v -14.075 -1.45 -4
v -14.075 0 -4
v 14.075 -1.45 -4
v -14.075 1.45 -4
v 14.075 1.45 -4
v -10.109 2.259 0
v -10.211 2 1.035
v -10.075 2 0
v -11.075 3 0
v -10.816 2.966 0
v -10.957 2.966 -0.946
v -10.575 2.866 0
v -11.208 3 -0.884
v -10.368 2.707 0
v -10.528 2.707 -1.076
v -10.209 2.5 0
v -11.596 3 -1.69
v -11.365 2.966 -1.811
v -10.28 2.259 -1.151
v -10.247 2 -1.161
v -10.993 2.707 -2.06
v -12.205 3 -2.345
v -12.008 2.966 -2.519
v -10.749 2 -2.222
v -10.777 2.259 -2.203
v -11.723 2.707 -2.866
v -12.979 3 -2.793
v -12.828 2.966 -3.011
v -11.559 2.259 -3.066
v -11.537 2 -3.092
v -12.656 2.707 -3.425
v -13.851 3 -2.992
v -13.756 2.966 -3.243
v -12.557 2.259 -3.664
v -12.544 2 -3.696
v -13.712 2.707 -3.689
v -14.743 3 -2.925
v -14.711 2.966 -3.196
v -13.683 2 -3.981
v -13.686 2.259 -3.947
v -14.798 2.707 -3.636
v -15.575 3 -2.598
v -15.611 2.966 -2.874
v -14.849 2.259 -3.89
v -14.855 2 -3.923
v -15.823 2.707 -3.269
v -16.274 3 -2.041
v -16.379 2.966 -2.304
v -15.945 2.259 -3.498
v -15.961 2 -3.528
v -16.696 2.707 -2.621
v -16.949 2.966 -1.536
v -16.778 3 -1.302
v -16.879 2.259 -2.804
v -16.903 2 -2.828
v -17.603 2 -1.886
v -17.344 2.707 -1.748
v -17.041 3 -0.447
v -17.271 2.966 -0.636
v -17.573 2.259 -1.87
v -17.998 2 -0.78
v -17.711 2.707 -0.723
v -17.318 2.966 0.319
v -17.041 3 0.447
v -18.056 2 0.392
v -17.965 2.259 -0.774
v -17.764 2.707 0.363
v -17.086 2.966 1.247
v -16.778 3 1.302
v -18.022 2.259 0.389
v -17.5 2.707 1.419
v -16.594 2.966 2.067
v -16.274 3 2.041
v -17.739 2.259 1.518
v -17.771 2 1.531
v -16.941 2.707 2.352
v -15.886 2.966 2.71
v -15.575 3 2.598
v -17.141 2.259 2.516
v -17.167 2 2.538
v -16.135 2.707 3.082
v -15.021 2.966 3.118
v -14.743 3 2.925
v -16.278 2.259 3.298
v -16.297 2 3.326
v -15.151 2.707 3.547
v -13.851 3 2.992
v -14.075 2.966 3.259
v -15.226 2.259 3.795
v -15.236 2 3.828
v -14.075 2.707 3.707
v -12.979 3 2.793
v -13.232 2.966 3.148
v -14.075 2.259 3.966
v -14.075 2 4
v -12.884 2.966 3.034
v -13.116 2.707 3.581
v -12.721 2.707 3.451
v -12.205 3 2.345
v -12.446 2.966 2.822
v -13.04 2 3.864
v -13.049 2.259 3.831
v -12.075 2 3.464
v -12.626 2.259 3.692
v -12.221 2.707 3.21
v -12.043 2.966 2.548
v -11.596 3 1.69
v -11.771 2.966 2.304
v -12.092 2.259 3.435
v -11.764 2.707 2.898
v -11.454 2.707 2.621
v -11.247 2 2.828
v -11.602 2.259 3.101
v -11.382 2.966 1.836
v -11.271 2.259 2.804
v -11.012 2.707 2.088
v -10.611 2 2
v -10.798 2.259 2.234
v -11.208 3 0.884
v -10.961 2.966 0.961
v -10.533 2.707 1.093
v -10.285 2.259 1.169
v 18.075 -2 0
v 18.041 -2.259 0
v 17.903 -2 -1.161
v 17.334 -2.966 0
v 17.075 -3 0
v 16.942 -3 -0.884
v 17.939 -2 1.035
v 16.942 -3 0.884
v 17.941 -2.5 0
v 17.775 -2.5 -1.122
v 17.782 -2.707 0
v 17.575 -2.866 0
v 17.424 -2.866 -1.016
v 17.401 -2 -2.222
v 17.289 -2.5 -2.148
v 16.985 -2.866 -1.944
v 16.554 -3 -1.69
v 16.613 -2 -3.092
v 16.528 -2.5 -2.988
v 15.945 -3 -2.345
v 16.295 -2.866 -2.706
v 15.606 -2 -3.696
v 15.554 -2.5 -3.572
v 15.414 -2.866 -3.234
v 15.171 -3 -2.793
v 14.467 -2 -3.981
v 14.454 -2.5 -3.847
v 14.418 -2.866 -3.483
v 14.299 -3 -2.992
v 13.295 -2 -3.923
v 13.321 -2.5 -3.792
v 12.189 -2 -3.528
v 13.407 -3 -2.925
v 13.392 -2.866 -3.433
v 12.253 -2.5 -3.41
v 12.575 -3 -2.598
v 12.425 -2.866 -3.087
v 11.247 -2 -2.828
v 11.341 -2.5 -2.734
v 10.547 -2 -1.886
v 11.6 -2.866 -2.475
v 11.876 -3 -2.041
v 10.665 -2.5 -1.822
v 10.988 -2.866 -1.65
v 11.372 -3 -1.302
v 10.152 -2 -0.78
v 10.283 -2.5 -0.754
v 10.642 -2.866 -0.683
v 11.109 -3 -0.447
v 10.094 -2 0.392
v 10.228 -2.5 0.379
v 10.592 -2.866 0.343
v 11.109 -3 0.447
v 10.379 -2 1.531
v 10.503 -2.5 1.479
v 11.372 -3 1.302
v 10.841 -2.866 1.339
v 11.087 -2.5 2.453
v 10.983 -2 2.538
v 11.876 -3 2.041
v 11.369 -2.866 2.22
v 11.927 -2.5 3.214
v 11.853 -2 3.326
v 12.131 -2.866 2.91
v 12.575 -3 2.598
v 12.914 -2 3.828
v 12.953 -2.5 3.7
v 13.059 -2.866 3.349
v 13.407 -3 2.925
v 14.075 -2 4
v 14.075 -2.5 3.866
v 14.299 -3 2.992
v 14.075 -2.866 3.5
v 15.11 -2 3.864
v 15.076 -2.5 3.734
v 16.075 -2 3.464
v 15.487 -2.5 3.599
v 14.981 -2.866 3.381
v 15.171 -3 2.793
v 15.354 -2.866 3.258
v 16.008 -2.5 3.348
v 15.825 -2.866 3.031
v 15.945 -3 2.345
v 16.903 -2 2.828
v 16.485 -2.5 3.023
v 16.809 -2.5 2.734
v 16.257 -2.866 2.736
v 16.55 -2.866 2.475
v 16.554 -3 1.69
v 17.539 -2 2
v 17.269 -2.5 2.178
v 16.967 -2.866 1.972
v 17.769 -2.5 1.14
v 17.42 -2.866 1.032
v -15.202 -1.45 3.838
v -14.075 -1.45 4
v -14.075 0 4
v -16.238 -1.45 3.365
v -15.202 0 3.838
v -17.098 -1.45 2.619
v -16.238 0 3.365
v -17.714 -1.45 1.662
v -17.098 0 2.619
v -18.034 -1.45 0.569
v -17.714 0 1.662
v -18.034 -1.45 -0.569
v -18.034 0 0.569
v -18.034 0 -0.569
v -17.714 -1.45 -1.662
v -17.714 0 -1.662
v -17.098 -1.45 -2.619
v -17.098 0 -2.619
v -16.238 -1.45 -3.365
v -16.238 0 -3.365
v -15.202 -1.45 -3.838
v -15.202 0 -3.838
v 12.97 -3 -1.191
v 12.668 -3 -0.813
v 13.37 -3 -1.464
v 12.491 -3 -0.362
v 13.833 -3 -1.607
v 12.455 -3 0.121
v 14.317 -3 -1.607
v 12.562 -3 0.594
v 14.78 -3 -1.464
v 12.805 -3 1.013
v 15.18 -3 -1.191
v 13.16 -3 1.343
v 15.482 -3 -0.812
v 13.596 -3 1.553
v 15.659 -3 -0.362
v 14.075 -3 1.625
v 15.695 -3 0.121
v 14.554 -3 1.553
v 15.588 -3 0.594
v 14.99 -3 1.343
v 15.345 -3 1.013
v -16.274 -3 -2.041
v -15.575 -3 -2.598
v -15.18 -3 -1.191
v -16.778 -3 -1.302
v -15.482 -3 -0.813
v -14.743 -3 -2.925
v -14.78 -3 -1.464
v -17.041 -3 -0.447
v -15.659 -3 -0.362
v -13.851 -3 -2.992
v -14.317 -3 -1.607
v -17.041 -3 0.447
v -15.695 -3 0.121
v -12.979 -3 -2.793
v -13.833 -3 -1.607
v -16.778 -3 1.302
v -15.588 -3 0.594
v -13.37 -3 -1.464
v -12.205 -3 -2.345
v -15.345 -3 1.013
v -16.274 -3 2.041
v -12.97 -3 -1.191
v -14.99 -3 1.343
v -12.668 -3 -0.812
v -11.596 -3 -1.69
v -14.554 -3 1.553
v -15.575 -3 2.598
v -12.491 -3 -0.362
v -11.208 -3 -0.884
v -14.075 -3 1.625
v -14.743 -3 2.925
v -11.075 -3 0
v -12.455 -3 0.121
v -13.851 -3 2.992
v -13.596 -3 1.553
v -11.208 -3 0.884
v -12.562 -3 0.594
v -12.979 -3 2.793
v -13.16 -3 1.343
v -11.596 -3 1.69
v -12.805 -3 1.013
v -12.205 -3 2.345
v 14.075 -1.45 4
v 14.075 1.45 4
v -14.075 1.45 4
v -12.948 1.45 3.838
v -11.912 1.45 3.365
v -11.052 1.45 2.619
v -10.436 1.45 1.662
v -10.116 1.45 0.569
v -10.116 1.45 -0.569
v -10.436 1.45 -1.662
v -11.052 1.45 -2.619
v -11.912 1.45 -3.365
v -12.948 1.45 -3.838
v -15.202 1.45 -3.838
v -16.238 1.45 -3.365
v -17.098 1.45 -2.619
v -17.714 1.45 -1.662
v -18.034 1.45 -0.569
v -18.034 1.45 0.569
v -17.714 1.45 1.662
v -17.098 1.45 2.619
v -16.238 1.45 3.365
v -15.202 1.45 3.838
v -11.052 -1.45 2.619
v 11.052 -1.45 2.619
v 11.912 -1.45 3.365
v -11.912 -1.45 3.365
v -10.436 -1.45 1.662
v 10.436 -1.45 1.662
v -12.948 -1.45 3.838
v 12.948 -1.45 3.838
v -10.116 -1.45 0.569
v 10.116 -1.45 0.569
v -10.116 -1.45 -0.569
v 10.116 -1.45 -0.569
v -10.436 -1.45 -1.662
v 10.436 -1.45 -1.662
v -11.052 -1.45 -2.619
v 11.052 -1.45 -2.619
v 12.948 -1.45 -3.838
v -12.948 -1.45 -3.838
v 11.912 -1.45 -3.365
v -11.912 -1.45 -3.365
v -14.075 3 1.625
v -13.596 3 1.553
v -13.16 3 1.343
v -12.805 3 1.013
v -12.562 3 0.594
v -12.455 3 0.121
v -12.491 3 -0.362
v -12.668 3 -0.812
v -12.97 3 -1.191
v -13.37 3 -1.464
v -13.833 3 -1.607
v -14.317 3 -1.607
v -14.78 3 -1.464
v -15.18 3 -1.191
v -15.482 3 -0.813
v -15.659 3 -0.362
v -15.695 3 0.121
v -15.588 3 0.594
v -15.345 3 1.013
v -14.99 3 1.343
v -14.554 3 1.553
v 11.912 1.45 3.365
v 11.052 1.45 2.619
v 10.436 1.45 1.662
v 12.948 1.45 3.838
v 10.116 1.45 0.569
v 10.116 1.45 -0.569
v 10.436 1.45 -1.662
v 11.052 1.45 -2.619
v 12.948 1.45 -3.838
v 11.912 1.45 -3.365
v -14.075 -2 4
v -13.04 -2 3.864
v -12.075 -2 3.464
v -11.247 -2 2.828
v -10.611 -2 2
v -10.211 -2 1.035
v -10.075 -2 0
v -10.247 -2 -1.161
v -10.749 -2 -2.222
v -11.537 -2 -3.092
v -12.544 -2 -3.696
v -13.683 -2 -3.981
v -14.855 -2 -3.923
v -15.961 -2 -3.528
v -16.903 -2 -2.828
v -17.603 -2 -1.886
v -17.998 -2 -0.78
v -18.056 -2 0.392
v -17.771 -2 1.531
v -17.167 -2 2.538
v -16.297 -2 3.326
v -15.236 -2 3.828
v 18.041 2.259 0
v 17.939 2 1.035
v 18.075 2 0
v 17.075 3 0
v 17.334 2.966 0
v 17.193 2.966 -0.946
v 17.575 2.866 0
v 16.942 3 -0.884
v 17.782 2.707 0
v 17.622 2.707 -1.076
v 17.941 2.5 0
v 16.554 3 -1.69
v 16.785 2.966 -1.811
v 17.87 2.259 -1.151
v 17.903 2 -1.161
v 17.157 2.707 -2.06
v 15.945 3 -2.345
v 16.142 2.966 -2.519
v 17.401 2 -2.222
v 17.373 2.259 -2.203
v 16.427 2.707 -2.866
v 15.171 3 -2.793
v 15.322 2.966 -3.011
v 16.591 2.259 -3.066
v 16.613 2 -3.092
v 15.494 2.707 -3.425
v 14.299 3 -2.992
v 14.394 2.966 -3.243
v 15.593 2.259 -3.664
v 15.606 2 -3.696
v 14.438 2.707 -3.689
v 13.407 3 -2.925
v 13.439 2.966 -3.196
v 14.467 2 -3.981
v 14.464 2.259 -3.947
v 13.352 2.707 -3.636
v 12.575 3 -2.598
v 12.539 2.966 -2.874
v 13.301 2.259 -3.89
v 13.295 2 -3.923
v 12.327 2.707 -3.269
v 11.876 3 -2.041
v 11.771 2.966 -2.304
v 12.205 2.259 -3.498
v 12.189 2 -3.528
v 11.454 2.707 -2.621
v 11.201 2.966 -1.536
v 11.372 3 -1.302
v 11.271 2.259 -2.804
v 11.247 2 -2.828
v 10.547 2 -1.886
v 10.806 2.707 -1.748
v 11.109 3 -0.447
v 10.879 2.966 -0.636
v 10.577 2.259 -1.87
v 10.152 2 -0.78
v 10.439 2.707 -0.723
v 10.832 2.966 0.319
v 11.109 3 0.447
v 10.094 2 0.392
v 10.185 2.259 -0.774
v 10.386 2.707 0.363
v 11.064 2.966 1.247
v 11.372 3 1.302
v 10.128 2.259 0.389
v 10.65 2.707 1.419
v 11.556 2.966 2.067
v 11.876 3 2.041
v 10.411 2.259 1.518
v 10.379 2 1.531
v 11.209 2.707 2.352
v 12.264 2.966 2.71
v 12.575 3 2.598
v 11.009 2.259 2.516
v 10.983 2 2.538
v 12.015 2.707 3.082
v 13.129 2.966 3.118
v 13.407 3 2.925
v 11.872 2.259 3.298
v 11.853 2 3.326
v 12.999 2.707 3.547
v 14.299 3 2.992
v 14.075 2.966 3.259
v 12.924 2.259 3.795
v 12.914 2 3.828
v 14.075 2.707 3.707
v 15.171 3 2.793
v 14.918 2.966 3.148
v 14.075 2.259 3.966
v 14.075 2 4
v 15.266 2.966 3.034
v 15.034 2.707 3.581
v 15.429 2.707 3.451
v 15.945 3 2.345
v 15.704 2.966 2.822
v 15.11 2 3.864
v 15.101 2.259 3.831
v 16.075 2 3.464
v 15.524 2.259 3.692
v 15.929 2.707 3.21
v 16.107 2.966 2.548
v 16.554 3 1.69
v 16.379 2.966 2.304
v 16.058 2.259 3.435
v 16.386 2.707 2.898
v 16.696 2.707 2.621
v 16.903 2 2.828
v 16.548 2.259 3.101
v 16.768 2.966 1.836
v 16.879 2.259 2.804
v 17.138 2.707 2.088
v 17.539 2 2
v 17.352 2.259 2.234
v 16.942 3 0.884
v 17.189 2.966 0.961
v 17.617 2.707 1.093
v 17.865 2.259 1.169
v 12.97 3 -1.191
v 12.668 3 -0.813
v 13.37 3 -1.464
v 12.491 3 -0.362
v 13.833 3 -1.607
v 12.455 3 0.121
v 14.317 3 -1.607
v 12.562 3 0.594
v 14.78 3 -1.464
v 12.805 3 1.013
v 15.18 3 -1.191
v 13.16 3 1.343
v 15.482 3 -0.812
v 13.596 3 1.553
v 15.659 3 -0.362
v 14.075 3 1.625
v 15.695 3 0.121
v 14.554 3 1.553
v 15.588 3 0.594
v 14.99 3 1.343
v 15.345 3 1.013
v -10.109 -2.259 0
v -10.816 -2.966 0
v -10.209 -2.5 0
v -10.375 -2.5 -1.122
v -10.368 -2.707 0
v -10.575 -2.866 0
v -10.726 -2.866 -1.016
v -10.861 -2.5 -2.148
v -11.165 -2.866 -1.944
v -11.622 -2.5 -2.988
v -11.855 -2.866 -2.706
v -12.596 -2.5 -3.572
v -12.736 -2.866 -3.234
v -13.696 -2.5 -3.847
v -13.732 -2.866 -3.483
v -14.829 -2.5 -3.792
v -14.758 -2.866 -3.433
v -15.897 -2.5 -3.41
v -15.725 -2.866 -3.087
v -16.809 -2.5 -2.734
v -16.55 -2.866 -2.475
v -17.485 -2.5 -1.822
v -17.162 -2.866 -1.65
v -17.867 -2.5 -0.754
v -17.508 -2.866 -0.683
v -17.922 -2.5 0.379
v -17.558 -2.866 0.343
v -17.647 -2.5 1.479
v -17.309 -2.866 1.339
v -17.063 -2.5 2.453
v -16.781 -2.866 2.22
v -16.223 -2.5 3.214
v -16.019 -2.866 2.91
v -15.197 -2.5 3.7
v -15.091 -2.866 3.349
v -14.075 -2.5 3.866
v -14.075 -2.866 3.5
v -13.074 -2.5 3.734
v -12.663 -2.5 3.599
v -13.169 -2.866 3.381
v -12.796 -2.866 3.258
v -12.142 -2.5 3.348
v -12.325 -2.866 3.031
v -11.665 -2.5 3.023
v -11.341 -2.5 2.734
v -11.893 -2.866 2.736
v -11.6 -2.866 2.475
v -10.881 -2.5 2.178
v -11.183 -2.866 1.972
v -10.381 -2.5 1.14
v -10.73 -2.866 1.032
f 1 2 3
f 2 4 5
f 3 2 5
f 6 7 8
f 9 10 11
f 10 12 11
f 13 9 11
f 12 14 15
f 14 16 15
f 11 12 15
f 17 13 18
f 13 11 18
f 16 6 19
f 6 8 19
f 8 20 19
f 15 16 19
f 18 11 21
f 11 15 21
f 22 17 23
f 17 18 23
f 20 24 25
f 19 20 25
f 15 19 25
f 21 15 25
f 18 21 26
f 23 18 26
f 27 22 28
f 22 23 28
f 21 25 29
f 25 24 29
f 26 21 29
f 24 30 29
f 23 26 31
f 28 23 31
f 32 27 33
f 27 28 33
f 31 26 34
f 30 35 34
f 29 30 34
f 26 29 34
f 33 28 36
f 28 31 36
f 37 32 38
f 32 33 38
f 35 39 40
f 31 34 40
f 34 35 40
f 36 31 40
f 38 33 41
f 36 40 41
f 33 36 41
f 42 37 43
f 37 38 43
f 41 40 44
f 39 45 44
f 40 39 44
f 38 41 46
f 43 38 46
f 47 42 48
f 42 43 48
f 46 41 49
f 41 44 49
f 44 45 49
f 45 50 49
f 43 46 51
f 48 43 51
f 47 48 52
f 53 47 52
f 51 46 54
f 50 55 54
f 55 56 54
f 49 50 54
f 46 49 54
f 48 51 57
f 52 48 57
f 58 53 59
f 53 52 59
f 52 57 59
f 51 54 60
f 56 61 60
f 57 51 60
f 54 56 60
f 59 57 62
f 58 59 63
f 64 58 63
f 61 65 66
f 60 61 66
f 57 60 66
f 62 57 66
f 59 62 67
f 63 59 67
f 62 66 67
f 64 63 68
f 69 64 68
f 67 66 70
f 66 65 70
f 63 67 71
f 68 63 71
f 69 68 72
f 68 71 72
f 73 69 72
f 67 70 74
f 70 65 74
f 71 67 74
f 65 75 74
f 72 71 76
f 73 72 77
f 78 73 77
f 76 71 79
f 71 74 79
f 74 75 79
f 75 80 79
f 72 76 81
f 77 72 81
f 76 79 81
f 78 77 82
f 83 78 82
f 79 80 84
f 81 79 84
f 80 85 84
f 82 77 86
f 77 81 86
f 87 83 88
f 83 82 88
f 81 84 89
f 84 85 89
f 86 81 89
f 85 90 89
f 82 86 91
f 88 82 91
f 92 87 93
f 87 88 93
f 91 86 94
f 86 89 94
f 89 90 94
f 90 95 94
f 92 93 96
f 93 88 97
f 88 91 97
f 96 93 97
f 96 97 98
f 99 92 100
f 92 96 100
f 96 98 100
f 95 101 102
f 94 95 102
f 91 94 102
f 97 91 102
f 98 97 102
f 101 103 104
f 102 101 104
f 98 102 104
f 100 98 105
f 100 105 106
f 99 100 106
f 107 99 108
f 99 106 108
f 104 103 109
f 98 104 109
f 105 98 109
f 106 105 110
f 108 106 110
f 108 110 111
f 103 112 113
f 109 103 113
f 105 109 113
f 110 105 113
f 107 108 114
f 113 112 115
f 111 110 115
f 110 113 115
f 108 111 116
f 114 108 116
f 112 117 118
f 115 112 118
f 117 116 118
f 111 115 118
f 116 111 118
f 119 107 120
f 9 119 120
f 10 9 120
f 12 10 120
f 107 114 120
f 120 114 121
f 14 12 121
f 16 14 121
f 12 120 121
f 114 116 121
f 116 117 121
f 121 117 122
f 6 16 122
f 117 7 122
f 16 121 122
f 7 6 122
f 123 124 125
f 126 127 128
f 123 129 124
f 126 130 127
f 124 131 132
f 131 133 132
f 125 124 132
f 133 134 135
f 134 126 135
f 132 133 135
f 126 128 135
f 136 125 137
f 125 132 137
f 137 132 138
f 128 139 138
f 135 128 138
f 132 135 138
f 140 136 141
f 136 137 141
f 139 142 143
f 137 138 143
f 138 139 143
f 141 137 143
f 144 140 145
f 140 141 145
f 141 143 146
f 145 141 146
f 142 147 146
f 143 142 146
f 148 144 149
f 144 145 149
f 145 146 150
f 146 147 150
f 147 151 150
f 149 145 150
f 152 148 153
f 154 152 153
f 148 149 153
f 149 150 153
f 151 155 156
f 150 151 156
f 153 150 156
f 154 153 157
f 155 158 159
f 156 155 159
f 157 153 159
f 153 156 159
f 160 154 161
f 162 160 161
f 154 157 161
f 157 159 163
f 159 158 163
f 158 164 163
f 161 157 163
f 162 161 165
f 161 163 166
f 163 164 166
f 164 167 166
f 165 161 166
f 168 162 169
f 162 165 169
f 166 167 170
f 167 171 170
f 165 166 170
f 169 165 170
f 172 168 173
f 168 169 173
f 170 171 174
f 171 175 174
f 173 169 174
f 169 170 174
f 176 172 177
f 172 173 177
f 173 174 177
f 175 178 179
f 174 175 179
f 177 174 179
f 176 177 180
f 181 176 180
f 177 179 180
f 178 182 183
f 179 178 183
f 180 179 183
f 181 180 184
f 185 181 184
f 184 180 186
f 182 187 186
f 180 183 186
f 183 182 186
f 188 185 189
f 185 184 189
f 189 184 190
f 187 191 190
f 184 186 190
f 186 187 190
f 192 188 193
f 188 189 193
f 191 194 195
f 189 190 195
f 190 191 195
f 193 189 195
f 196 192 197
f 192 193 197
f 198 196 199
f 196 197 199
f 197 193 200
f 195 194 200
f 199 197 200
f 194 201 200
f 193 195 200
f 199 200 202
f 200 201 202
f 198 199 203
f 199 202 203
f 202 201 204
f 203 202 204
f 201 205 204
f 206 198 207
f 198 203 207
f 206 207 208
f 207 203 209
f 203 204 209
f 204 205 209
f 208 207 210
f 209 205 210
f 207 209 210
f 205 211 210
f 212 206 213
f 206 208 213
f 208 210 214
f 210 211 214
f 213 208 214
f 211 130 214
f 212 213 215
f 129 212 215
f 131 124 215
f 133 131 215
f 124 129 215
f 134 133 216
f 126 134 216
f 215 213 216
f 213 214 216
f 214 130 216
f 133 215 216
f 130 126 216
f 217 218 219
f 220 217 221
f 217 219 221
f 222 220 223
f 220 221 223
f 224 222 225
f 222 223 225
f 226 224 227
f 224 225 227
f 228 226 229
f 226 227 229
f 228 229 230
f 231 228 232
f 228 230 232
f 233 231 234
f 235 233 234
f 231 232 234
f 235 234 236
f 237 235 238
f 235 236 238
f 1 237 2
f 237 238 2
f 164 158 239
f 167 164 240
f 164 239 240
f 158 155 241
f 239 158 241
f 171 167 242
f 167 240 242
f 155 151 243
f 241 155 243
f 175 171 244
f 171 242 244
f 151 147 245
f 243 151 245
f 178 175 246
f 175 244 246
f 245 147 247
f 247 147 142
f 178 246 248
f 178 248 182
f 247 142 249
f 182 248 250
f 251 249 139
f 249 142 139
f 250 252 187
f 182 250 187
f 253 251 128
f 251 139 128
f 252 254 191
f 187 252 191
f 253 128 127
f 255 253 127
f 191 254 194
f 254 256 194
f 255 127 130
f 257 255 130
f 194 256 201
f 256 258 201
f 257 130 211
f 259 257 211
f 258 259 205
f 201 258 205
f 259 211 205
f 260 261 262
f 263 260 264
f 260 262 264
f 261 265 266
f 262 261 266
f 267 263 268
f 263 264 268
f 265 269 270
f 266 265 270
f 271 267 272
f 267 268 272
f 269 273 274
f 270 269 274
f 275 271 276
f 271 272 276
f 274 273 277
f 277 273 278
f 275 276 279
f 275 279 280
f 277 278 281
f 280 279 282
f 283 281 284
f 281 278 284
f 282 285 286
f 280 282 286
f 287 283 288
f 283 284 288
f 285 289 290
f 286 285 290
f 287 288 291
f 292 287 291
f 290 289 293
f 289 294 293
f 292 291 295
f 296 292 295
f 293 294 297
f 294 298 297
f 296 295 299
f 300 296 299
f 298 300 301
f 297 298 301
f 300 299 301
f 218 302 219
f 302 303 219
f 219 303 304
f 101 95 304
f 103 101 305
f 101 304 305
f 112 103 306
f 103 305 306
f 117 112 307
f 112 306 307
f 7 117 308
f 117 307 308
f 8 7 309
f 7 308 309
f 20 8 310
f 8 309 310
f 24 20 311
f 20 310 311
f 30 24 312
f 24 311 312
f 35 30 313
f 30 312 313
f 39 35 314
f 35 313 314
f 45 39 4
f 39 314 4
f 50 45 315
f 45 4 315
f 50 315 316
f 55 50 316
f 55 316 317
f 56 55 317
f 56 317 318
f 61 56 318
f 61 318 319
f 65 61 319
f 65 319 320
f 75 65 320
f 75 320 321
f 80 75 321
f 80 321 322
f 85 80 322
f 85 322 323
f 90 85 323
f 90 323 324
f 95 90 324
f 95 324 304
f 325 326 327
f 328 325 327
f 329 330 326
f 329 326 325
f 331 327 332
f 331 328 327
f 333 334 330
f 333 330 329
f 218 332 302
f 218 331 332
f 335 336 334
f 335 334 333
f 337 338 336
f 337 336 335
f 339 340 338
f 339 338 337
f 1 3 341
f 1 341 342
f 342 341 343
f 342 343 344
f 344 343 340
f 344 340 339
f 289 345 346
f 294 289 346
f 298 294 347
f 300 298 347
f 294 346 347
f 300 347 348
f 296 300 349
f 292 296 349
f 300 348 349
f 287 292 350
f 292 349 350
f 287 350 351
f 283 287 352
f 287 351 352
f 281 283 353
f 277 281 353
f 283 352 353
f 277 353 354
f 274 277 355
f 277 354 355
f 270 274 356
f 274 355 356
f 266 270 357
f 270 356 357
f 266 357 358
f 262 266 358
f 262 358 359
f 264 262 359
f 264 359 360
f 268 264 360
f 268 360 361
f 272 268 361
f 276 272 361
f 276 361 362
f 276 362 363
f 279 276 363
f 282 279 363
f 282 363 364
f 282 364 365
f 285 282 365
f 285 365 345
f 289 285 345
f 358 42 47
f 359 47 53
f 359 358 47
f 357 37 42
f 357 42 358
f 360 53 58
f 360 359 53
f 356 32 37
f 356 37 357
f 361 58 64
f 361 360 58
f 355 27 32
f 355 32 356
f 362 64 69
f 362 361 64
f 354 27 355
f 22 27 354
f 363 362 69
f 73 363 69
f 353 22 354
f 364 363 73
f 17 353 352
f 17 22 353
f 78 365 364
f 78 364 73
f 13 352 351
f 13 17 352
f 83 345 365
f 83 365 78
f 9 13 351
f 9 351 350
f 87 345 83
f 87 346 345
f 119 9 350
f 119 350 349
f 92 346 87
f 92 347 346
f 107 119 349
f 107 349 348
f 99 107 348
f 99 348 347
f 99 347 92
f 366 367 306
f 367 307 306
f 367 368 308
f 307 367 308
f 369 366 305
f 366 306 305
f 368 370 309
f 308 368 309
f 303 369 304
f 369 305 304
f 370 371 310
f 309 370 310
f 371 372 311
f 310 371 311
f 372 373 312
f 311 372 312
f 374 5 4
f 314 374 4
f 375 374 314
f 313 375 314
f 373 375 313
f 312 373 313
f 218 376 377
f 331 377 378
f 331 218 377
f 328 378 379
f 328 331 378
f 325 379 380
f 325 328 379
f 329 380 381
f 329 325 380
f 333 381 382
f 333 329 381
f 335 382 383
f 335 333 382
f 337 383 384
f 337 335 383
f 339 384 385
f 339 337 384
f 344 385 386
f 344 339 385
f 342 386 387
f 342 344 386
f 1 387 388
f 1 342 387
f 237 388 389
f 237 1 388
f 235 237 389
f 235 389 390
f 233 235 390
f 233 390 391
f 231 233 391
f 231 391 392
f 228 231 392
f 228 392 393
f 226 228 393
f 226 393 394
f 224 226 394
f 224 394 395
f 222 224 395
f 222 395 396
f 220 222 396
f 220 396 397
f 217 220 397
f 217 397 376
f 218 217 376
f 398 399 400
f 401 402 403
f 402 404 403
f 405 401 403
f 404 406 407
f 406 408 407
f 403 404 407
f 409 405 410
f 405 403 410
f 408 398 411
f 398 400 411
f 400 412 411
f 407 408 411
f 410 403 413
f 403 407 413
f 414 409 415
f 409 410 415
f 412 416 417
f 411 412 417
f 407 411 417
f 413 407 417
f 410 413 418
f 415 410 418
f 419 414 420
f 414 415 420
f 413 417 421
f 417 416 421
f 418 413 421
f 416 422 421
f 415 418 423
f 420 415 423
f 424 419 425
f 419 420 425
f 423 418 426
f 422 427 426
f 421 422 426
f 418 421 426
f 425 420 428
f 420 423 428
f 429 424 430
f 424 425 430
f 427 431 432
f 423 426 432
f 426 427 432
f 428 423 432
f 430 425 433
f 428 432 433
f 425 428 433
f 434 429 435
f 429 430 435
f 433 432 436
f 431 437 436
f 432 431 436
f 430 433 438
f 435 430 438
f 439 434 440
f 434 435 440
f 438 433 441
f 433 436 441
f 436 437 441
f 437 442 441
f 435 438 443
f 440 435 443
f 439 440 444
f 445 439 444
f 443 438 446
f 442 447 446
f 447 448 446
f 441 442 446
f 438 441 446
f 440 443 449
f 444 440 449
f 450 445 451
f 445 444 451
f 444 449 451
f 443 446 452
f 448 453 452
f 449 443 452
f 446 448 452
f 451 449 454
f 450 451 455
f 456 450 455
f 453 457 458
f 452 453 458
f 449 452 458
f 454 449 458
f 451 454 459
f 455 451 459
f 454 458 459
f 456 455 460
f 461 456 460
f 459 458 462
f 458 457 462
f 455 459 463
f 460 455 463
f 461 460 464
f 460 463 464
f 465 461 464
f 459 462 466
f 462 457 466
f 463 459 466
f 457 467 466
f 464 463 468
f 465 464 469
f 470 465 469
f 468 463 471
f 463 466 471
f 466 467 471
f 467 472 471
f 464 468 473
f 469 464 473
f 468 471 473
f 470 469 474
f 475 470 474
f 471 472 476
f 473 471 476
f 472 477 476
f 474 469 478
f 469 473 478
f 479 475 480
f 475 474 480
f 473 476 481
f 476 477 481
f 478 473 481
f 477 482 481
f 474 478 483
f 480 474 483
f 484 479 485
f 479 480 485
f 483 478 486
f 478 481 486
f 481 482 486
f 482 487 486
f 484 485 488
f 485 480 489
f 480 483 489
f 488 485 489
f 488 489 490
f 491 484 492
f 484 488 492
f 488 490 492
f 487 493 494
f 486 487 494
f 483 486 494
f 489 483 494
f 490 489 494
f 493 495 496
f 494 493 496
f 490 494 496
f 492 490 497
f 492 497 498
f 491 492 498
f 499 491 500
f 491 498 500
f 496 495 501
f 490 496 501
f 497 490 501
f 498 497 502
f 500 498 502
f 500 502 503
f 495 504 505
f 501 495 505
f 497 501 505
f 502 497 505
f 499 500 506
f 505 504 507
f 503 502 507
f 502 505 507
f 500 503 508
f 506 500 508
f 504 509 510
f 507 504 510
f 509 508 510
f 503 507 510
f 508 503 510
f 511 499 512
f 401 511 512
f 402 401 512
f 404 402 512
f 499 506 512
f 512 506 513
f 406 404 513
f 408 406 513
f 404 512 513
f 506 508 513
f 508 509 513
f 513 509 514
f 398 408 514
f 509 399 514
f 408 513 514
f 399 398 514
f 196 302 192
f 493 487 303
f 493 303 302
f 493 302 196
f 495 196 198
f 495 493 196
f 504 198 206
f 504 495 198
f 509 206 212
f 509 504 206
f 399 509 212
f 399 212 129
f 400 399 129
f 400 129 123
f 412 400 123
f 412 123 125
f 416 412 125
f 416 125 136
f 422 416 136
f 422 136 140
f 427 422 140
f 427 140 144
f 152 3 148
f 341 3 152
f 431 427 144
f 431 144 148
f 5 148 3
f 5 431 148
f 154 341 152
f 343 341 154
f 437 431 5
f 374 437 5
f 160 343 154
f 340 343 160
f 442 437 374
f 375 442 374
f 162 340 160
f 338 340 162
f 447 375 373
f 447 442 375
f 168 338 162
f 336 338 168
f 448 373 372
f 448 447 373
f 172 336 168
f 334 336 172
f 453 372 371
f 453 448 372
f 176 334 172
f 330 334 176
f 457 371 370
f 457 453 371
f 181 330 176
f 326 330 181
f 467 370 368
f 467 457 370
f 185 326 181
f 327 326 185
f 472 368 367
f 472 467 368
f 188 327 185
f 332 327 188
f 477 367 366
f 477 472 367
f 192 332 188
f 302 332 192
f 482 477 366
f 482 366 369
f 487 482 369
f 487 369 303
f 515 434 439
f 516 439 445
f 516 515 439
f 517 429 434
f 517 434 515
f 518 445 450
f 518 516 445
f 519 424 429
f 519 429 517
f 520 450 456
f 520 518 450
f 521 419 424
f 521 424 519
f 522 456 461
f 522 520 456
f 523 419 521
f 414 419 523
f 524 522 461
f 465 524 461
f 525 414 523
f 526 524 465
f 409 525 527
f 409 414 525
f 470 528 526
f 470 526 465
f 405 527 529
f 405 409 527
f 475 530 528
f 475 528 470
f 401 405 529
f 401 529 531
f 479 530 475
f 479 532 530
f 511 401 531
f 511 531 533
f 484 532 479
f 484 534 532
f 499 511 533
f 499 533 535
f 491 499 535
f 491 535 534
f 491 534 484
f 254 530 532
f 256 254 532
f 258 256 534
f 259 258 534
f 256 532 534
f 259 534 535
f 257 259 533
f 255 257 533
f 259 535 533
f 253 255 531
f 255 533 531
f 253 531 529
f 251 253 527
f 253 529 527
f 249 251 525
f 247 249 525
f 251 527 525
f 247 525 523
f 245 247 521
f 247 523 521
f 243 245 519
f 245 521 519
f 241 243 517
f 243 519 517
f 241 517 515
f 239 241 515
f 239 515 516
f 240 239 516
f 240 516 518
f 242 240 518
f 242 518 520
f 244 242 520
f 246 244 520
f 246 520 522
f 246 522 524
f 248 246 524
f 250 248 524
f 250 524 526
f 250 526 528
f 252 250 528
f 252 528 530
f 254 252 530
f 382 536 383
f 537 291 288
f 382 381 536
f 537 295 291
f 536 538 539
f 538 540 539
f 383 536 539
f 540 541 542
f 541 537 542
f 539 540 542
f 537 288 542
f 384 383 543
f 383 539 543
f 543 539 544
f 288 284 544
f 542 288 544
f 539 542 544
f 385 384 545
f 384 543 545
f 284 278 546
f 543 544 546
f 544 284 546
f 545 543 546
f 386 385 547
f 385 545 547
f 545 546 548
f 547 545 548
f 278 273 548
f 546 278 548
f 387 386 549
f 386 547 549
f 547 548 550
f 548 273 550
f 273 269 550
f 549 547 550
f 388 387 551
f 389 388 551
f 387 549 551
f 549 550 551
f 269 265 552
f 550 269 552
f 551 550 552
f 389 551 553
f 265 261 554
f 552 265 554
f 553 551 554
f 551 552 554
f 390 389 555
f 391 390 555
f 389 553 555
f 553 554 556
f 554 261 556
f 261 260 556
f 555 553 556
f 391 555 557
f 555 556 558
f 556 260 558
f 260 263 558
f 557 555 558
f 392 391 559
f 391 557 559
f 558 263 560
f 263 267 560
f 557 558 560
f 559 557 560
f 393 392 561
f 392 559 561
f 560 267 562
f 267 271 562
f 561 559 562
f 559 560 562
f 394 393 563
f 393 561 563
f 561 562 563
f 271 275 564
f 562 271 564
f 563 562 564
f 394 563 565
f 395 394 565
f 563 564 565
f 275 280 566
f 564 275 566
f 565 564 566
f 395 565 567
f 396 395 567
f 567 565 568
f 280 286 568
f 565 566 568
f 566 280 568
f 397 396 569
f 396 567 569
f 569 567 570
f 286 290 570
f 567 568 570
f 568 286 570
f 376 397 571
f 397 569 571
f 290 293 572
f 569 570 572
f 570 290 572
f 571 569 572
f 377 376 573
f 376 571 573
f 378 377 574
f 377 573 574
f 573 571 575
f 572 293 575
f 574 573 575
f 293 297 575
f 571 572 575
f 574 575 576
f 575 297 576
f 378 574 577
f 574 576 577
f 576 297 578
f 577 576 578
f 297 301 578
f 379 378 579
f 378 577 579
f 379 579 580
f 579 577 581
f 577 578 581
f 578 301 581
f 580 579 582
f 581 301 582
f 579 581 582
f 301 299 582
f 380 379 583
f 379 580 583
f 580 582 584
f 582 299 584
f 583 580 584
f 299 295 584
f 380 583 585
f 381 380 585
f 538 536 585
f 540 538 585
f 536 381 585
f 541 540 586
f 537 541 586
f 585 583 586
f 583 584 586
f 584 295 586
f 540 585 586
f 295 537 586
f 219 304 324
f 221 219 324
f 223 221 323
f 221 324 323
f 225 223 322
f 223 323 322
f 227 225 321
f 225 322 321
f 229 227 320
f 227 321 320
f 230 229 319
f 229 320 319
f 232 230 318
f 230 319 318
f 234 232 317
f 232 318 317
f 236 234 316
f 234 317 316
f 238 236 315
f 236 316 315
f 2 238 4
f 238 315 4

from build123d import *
from build123d.topology import SkipClean

# Parameters (mm, degrees)
BOSS_EXTRUDE1_DEPTH = 1.45
SKETCH2_R           = 4
BOSS_EXTRUDE2_DEPTH = 3
FILLET1_R           = 1
SKETCH3_R           = 1.625
CUT_EXTRUDE1_DEPTH  = 20.460360465


with BuildPart() as part:
    # Sketch1 → Boss-Extrude1 (new, symmetric)
    with BuildSketch(Plane(origin=(0, 0, 0), x_dir=(1, 0, 0), z_dir=(0, 1, 0))):
        with BuildLine():
            Line((-14.075, 4), (14.075, 4))
            ThreePointArc((14.075, 4), (18.075, 0), (14.075, -4))
            Line((14.075, -4), (-14.075, -4))
            ThreePointArc((-14.075, -4), (-18.075, 0), (-14.075, 4))
        make_face()
    extrude(amount=BOSS_EXTRUDE1_DEPTH, both=True)

    # Sketch2 → Boss-Extrude2 (add, symmetric)
    with SkipClean():  # the faces are left unmerged after this step: merging them gives an invalid solid
        with BuildSketch(Plane(origin=(0, 0, 0), x_dir=(1, 0, 0), z_dir=(0, 1, 0))):
            with Locations((-14.075, 0)):
                Circle(SKETCH2_R)
            with Locations((14.075, 0)):
                Circle(SKETCH2_R)
        extrude(amount=BOSS_EXTRUDE2_DEPTH, both=True)
    add(part.part.scale(1), mode=Mode.REPLACE)  # the faces are merged on a copy

    # Fillet1
    fillet1_edges = [part.edges().sort_by_distance(p)[0] for p in [
        (10.075, 3, 0),
        (10.075, -3, 0),
        (-18.075, -3, 0),
        (-18.075, 3, 0),
    ]]
    fillet(fillet1_edges, radius=FILLET1_R)

    # Sketch3 → Cut-Extrude1 (cut, through all)
    with BuildSketch(Plane(origin=(0, 3, 0), x_dir=(1, 0, 0), z_dir=(0, 1, 0))):
        with Locations((-14.075, 0)):
            Circle(SKETCH3_R)
        with Locations((14.075, 0)):
            Circle(SKETCH3_R)
    extrude(amount=-CUT_EXTRUDE1_DEPTH, mode=Mode.SUBTRACT)


solid = part.part
